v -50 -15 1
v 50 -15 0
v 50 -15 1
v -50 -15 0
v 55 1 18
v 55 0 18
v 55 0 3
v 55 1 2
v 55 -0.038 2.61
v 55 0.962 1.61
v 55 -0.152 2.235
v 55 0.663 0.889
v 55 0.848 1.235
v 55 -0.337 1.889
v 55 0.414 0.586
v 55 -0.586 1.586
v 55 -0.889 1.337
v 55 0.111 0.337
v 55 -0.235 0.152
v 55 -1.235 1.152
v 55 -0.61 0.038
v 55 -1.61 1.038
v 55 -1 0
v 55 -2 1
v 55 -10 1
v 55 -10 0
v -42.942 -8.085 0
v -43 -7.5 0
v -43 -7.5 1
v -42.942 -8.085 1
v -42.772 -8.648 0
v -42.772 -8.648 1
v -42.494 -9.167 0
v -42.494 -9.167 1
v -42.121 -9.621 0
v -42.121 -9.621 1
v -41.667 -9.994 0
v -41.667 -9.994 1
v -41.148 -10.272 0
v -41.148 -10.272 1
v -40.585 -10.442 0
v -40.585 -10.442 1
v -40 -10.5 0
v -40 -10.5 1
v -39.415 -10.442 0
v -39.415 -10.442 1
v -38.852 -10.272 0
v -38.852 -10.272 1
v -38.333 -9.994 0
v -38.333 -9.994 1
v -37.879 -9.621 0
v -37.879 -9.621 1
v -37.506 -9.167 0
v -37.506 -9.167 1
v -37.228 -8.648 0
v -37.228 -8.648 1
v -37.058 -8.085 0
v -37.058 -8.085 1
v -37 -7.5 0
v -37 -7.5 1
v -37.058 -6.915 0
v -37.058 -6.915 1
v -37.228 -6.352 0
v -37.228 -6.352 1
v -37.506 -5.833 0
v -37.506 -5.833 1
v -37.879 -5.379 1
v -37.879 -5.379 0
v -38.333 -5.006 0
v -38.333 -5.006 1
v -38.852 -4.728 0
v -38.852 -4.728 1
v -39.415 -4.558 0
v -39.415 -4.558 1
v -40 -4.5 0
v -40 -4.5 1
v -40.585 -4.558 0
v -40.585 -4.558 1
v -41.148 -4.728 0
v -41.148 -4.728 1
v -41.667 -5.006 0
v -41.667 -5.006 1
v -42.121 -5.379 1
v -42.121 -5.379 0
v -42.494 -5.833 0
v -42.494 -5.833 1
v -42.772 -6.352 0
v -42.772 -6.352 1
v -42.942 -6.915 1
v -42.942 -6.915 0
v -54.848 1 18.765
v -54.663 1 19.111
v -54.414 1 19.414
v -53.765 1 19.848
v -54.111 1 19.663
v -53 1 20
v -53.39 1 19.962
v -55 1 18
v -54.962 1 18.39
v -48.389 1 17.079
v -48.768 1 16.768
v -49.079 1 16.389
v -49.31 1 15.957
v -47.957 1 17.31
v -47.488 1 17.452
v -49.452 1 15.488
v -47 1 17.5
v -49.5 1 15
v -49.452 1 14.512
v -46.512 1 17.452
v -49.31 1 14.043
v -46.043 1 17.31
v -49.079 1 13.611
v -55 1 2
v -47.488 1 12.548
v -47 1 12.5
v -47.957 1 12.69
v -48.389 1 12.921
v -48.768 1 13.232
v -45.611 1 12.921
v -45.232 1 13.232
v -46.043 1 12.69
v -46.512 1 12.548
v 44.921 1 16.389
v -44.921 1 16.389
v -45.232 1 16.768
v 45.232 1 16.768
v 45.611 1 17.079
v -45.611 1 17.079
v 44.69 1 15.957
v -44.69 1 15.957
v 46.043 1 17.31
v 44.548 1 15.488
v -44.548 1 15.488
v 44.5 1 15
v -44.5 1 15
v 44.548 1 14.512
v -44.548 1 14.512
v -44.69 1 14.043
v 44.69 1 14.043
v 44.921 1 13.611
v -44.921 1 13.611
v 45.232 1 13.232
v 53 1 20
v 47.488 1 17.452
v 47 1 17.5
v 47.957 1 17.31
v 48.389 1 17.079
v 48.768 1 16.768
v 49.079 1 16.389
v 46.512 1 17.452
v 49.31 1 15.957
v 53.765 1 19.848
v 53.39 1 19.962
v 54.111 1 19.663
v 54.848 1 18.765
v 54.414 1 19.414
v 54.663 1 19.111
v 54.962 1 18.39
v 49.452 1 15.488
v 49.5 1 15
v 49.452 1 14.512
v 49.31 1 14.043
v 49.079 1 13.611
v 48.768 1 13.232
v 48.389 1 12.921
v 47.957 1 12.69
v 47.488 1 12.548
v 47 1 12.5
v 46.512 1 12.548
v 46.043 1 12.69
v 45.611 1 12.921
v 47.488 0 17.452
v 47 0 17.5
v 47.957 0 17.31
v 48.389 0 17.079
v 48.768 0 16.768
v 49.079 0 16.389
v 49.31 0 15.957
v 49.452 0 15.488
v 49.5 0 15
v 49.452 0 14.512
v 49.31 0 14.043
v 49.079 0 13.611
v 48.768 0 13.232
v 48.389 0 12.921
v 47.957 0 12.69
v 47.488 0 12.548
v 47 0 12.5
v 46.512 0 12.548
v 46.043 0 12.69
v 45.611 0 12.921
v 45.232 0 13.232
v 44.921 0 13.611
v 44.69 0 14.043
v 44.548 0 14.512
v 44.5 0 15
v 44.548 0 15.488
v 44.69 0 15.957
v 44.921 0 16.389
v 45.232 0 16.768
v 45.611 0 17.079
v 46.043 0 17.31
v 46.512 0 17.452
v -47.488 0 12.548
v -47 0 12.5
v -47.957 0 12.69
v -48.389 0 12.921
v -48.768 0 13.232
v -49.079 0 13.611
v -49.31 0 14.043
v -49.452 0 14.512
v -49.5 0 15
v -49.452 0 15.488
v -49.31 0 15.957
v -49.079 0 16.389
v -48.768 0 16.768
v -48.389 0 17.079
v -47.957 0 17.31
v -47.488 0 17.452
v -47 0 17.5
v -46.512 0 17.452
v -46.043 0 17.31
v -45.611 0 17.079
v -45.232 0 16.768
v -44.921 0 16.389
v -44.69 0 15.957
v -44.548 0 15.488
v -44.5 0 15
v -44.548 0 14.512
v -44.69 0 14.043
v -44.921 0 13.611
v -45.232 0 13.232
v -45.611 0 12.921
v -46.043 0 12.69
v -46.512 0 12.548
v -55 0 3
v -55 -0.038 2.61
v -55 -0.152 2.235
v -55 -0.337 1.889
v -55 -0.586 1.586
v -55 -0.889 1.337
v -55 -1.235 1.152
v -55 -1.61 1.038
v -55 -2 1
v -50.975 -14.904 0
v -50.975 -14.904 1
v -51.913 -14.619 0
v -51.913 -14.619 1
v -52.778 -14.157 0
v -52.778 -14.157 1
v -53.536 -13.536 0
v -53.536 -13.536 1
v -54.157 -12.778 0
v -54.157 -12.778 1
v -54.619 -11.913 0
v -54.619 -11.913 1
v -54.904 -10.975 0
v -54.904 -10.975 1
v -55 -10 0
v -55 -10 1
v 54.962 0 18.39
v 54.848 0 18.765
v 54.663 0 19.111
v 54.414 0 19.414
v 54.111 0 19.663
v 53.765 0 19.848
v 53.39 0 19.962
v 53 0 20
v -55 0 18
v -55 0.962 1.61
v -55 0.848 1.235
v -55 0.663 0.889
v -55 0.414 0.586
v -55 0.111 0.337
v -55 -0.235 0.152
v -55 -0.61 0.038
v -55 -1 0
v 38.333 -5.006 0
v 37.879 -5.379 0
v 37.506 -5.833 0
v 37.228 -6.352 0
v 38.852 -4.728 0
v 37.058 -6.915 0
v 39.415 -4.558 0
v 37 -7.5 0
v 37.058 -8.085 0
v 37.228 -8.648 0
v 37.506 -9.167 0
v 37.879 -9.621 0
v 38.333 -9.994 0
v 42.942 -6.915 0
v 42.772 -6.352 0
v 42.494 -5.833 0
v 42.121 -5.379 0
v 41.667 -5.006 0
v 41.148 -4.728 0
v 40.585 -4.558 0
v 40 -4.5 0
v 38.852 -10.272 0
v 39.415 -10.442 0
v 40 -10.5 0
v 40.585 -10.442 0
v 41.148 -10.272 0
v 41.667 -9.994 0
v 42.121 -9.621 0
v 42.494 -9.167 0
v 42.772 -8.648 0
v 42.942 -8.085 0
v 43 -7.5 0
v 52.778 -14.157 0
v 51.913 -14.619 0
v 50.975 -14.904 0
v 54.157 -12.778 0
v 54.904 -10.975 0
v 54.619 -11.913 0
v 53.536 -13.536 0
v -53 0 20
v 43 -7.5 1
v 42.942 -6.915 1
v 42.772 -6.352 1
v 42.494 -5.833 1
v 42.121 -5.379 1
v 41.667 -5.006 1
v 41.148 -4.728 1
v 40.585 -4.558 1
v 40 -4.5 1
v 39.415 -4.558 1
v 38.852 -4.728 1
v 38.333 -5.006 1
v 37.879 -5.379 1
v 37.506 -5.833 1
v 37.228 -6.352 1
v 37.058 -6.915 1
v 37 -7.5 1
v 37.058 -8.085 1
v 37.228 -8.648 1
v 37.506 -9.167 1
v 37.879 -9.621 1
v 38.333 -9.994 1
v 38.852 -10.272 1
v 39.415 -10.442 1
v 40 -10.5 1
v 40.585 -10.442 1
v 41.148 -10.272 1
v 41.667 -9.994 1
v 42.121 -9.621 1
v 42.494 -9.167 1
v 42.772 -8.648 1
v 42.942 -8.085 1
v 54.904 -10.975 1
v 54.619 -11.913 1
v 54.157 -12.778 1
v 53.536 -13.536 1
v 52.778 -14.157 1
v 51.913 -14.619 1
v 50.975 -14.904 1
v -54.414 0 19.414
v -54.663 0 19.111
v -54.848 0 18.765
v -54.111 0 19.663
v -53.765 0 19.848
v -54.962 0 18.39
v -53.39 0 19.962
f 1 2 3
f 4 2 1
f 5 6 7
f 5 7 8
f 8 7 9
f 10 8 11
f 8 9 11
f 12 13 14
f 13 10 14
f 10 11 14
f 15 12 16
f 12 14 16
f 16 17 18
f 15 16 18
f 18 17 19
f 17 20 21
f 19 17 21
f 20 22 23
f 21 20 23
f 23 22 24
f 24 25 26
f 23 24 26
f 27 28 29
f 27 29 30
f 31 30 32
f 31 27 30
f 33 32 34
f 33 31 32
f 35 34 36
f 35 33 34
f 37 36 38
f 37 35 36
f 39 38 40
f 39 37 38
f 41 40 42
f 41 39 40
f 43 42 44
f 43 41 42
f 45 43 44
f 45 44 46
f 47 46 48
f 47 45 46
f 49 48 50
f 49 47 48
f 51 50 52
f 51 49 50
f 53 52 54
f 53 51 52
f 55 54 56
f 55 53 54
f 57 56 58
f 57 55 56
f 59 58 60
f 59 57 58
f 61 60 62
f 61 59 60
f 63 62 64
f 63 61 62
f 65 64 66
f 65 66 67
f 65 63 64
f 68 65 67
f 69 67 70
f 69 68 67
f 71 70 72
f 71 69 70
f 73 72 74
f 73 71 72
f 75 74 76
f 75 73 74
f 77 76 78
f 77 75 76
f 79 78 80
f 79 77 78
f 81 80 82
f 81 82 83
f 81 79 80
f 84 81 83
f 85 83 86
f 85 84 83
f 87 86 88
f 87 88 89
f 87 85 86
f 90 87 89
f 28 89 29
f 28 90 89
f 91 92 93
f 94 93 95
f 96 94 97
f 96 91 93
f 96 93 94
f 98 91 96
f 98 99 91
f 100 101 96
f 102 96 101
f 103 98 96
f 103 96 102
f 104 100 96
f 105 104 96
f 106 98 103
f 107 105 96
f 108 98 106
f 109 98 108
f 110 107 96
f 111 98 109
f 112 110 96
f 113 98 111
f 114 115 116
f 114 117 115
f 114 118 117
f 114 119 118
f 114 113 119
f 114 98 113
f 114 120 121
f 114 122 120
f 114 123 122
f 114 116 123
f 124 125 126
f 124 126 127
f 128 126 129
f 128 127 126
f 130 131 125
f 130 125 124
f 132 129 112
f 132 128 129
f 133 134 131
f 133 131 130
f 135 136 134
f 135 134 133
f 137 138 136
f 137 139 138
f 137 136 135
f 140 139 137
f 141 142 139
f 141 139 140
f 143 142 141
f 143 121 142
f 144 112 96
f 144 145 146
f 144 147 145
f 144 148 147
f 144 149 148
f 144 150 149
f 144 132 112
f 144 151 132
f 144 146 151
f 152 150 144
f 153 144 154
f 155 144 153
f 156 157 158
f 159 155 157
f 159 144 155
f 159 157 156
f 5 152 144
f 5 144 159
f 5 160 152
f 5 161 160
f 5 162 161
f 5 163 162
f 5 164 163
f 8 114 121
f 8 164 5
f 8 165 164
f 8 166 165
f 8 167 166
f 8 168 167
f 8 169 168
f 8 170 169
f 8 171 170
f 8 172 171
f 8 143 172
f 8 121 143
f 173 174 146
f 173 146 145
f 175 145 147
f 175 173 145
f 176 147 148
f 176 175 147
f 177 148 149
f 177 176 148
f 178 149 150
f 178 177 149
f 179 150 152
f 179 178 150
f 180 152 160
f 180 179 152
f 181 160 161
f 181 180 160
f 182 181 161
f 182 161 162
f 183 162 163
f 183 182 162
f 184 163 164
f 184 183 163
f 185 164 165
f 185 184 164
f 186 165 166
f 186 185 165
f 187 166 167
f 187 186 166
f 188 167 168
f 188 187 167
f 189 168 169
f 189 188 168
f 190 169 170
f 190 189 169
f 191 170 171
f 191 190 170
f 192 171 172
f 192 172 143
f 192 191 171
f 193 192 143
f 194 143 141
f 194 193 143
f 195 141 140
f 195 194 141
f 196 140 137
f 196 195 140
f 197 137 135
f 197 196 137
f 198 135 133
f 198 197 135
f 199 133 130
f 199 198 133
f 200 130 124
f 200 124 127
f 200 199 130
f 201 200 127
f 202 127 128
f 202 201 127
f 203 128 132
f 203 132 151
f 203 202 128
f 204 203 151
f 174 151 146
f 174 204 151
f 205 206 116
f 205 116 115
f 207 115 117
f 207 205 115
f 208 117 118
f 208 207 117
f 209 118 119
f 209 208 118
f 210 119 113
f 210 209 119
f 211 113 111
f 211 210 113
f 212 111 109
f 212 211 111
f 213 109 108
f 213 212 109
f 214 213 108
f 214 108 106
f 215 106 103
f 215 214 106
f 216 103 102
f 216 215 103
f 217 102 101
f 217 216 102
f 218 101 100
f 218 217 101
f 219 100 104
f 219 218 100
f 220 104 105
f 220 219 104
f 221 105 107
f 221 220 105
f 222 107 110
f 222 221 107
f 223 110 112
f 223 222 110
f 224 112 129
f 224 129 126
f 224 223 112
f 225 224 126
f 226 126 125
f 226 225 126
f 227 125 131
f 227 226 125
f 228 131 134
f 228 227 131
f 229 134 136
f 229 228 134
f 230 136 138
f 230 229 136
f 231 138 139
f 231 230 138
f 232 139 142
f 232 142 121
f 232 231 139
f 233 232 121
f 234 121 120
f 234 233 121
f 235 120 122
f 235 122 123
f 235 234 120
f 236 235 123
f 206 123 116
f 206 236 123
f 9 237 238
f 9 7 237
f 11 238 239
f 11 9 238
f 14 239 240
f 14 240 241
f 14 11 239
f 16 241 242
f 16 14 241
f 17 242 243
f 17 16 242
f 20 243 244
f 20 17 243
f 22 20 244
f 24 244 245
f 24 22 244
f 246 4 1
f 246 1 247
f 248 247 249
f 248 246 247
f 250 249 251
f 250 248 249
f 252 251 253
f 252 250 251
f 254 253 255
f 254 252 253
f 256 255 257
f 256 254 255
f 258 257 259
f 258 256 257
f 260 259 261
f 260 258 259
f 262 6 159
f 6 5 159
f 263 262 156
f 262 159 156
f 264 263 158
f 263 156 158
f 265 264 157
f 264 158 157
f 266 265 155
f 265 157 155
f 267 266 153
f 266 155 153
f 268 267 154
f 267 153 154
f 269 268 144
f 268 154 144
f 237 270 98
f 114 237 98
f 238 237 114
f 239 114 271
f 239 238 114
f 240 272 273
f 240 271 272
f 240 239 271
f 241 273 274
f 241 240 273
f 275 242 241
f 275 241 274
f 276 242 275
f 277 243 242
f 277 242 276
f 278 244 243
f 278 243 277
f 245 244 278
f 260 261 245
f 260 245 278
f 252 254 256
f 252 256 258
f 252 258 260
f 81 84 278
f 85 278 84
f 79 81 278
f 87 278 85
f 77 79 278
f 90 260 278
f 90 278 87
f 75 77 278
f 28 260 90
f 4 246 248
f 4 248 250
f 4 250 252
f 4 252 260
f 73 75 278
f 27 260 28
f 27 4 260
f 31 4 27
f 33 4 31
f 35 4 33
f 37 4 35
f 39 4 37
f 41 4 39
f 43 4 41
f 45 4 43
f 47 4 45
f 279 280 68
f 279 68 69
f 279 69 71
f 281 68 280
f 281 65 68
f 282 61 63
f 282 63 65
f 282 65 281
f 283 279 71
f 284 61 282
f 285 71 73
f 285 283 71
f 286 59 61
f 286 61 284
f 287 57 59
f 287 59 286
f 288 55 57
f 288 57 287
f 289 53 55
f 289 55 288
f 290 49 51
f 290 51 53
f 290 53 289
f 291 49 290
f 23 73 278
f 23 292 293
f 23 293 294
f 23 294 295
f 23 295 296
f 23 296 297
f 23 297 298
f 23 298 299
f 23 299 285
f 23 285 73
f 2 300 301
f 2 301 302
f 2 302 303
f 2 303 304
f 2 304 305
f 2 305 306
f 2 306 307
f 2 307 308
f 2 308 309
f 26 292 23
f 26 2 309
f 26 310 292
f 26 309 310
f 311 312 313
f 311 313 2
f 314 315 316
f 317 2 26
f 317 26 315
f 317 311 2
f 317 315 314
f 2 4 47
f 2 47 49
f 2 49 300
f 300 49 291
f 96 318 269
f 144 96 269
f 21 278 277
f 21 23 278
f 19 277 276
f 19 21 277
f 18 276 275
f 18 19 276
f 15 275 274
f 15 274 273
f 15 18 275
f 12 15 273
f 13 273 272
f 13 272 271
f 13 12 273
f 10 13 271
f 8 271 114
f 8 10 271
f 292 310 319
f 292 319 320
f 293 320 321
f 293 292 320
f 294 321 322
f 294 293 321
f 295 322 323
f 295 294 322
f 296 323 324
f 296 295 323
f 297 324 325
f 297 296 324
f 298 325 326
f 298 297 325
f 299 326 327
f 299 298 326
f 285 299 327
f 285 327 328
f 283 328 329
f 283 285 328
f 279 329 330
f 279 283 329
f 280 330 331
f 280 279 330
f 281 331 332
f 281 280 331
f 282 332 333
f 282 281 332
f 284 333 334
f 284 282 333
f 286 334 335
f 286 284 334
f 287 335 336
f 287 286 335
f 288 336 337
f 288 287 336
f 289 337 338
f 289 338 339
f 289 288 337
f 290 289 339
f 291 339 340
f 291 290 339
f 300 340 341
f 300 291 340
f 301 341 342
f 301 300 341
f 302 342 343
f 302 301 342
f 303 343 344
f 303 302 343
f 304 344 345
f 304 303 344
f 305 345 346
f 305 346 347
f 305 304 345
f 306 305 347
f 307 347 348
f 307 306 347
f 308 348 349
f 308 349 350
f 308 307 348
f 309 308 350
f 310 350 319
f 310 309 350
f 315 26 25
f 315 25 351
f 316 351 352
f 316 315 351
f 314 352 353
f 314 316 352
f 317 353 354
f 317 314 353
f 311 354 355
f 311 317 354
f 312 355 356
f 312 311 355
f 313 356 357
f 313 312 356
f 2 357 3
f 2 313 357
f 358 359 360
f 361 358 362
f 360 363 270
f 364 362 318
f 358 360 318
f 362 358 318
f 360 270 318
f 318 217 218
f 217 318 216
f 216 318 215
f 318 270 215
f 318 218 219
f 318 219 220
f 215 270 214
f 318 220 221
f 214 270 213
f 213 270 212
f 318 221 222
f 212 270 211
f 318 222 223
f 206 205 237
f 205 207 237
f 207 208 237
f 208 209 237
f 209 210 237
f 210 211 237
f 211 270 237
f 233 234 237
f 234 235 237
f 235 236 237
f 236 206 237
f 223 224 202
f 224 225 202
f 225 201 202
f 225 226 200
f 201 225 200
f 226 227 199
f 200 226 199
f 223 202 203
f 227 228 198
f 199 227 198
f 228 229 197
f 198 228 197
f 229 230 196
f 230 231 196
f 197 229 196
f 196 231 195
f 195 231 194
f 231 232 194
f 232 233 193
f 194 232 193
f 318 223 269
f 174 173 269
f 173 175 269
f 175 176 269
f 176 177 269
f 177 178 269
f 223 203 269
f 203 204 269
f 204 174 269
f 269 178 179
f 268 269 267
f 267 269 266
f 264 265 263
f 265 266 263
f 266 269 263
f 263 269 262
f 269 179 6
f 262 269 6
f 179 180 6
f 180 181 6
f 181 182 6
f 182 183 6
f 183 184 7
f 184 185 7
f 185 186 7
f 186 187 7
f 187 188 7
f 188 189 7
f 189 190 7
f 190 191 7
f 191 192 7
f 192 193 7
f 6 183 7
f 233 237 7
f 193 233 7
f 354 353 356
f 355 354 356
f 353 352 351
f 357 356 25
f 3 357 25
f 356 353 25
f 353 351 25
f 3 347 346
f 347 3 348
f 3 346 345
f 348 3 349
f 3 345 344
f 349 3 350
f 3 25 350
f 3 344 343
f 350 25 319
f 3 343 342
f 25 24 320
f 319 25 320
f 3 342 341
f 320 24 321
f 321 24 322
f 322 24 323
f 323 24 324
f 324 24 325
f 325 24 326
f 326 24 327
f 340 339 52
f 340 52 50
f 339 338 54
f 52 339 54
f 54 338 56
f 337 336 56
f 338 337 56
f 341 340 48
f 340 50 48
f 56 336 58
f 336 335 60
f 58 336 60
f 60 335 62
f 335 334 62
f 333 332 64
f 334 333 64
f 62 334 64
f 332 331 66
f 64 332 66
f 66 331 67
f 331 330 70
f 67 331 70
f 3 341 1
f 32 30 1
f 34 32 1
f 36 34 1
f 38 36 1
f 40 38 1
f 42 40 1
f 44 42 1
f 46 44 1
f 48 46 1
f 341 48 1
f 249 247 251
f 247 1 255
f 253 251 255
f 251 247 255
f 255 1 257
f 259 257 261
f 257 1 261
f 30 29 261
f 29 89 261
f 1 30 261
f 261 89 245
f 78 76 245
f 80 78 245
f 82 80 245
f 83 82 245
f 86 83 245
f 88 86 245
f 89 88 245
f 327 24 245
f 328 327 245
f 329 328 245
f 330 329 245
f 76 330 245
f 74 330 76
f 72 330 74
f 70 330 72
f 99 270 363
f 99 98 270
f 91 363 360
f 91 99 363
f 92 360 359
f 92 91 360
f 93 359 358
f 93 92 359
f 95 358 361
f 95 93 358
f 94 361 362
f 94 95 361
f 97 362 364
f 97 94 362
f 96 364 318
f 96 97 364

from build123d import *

# Parameters (mm, degrees)
SKETCH1_R           = 3
BOSS_EXTRUDE1_DEPTH = 1
SKETCH2_W           = 110
SKETCH2_H           = 20
SKETCH2_R           = 2.5
BOSS_EXTRUDE2_DEPTH = 1
FILLET1_R           = 2


with BuildPart() as part:
    # Sketch1 → Boss-Extrude1 (new body)
    with BuildSketch(Plane.XY):
        with BuildLine():
            Line((-55, 0), (55, 0))
            Line((55, 0), (55, -10))
            ThreePointArc((55, -10), (53.535533906, -13.535533906), (50, -15))
            Line((50, -15), (-50, -15))
            ThreePointArc((-50, -15), (-53.535533906, -13.535533906), (-55, -10))
            Line((-55, -10), (-55, 0))
        make_face()
        with Locations((40, -7.5)):
            Circle(SKETCH1_R, mode=Mode.SUBTRACT)
        with Locations(Location((-40, -7.5, 0), (0, 0, 180))):
            Circle(SKETCH1_R, mode=Mode.SUBTRACT)
    extrude(amount=BOSS_EXTRUDE1_DEPTH)

    # Sketch2 → Boss-Extrude2 (add)
    with BuildSketch(Plane(origin=(0, 0, 0), x_dir=(1, 0, 0), z_dir=(0, 1, 0))):
        with Locations((0, -10)):
            Rectangle(SKETCH2_W, SKETCH2_H)
        with Locations(Location((47, -15, 0), (0, 0, 270))):
            Circle(SKETCH2_R, mode=Mode.SUBTRACT)
        with Locations(Location((-47, -15, 0), (0, 0, 90))):
            Circle(SKETCH2_R, mode=Mode.SUBTRACT)
    extrude(amount=BOSS_EXTRUDE2_DEPTH)

    # Fillet1
    fillet1_edges = [part.edges().sort_by_distance(p)[0] for p in [
        (0, 0, 1),
        (0, 1, 0),
        (55, 0.5, 20),
        (-55, 0.5, 20),
    ]]
    fillet(fillet1_edges, radius=FILLET1_R)


solid = part.part
